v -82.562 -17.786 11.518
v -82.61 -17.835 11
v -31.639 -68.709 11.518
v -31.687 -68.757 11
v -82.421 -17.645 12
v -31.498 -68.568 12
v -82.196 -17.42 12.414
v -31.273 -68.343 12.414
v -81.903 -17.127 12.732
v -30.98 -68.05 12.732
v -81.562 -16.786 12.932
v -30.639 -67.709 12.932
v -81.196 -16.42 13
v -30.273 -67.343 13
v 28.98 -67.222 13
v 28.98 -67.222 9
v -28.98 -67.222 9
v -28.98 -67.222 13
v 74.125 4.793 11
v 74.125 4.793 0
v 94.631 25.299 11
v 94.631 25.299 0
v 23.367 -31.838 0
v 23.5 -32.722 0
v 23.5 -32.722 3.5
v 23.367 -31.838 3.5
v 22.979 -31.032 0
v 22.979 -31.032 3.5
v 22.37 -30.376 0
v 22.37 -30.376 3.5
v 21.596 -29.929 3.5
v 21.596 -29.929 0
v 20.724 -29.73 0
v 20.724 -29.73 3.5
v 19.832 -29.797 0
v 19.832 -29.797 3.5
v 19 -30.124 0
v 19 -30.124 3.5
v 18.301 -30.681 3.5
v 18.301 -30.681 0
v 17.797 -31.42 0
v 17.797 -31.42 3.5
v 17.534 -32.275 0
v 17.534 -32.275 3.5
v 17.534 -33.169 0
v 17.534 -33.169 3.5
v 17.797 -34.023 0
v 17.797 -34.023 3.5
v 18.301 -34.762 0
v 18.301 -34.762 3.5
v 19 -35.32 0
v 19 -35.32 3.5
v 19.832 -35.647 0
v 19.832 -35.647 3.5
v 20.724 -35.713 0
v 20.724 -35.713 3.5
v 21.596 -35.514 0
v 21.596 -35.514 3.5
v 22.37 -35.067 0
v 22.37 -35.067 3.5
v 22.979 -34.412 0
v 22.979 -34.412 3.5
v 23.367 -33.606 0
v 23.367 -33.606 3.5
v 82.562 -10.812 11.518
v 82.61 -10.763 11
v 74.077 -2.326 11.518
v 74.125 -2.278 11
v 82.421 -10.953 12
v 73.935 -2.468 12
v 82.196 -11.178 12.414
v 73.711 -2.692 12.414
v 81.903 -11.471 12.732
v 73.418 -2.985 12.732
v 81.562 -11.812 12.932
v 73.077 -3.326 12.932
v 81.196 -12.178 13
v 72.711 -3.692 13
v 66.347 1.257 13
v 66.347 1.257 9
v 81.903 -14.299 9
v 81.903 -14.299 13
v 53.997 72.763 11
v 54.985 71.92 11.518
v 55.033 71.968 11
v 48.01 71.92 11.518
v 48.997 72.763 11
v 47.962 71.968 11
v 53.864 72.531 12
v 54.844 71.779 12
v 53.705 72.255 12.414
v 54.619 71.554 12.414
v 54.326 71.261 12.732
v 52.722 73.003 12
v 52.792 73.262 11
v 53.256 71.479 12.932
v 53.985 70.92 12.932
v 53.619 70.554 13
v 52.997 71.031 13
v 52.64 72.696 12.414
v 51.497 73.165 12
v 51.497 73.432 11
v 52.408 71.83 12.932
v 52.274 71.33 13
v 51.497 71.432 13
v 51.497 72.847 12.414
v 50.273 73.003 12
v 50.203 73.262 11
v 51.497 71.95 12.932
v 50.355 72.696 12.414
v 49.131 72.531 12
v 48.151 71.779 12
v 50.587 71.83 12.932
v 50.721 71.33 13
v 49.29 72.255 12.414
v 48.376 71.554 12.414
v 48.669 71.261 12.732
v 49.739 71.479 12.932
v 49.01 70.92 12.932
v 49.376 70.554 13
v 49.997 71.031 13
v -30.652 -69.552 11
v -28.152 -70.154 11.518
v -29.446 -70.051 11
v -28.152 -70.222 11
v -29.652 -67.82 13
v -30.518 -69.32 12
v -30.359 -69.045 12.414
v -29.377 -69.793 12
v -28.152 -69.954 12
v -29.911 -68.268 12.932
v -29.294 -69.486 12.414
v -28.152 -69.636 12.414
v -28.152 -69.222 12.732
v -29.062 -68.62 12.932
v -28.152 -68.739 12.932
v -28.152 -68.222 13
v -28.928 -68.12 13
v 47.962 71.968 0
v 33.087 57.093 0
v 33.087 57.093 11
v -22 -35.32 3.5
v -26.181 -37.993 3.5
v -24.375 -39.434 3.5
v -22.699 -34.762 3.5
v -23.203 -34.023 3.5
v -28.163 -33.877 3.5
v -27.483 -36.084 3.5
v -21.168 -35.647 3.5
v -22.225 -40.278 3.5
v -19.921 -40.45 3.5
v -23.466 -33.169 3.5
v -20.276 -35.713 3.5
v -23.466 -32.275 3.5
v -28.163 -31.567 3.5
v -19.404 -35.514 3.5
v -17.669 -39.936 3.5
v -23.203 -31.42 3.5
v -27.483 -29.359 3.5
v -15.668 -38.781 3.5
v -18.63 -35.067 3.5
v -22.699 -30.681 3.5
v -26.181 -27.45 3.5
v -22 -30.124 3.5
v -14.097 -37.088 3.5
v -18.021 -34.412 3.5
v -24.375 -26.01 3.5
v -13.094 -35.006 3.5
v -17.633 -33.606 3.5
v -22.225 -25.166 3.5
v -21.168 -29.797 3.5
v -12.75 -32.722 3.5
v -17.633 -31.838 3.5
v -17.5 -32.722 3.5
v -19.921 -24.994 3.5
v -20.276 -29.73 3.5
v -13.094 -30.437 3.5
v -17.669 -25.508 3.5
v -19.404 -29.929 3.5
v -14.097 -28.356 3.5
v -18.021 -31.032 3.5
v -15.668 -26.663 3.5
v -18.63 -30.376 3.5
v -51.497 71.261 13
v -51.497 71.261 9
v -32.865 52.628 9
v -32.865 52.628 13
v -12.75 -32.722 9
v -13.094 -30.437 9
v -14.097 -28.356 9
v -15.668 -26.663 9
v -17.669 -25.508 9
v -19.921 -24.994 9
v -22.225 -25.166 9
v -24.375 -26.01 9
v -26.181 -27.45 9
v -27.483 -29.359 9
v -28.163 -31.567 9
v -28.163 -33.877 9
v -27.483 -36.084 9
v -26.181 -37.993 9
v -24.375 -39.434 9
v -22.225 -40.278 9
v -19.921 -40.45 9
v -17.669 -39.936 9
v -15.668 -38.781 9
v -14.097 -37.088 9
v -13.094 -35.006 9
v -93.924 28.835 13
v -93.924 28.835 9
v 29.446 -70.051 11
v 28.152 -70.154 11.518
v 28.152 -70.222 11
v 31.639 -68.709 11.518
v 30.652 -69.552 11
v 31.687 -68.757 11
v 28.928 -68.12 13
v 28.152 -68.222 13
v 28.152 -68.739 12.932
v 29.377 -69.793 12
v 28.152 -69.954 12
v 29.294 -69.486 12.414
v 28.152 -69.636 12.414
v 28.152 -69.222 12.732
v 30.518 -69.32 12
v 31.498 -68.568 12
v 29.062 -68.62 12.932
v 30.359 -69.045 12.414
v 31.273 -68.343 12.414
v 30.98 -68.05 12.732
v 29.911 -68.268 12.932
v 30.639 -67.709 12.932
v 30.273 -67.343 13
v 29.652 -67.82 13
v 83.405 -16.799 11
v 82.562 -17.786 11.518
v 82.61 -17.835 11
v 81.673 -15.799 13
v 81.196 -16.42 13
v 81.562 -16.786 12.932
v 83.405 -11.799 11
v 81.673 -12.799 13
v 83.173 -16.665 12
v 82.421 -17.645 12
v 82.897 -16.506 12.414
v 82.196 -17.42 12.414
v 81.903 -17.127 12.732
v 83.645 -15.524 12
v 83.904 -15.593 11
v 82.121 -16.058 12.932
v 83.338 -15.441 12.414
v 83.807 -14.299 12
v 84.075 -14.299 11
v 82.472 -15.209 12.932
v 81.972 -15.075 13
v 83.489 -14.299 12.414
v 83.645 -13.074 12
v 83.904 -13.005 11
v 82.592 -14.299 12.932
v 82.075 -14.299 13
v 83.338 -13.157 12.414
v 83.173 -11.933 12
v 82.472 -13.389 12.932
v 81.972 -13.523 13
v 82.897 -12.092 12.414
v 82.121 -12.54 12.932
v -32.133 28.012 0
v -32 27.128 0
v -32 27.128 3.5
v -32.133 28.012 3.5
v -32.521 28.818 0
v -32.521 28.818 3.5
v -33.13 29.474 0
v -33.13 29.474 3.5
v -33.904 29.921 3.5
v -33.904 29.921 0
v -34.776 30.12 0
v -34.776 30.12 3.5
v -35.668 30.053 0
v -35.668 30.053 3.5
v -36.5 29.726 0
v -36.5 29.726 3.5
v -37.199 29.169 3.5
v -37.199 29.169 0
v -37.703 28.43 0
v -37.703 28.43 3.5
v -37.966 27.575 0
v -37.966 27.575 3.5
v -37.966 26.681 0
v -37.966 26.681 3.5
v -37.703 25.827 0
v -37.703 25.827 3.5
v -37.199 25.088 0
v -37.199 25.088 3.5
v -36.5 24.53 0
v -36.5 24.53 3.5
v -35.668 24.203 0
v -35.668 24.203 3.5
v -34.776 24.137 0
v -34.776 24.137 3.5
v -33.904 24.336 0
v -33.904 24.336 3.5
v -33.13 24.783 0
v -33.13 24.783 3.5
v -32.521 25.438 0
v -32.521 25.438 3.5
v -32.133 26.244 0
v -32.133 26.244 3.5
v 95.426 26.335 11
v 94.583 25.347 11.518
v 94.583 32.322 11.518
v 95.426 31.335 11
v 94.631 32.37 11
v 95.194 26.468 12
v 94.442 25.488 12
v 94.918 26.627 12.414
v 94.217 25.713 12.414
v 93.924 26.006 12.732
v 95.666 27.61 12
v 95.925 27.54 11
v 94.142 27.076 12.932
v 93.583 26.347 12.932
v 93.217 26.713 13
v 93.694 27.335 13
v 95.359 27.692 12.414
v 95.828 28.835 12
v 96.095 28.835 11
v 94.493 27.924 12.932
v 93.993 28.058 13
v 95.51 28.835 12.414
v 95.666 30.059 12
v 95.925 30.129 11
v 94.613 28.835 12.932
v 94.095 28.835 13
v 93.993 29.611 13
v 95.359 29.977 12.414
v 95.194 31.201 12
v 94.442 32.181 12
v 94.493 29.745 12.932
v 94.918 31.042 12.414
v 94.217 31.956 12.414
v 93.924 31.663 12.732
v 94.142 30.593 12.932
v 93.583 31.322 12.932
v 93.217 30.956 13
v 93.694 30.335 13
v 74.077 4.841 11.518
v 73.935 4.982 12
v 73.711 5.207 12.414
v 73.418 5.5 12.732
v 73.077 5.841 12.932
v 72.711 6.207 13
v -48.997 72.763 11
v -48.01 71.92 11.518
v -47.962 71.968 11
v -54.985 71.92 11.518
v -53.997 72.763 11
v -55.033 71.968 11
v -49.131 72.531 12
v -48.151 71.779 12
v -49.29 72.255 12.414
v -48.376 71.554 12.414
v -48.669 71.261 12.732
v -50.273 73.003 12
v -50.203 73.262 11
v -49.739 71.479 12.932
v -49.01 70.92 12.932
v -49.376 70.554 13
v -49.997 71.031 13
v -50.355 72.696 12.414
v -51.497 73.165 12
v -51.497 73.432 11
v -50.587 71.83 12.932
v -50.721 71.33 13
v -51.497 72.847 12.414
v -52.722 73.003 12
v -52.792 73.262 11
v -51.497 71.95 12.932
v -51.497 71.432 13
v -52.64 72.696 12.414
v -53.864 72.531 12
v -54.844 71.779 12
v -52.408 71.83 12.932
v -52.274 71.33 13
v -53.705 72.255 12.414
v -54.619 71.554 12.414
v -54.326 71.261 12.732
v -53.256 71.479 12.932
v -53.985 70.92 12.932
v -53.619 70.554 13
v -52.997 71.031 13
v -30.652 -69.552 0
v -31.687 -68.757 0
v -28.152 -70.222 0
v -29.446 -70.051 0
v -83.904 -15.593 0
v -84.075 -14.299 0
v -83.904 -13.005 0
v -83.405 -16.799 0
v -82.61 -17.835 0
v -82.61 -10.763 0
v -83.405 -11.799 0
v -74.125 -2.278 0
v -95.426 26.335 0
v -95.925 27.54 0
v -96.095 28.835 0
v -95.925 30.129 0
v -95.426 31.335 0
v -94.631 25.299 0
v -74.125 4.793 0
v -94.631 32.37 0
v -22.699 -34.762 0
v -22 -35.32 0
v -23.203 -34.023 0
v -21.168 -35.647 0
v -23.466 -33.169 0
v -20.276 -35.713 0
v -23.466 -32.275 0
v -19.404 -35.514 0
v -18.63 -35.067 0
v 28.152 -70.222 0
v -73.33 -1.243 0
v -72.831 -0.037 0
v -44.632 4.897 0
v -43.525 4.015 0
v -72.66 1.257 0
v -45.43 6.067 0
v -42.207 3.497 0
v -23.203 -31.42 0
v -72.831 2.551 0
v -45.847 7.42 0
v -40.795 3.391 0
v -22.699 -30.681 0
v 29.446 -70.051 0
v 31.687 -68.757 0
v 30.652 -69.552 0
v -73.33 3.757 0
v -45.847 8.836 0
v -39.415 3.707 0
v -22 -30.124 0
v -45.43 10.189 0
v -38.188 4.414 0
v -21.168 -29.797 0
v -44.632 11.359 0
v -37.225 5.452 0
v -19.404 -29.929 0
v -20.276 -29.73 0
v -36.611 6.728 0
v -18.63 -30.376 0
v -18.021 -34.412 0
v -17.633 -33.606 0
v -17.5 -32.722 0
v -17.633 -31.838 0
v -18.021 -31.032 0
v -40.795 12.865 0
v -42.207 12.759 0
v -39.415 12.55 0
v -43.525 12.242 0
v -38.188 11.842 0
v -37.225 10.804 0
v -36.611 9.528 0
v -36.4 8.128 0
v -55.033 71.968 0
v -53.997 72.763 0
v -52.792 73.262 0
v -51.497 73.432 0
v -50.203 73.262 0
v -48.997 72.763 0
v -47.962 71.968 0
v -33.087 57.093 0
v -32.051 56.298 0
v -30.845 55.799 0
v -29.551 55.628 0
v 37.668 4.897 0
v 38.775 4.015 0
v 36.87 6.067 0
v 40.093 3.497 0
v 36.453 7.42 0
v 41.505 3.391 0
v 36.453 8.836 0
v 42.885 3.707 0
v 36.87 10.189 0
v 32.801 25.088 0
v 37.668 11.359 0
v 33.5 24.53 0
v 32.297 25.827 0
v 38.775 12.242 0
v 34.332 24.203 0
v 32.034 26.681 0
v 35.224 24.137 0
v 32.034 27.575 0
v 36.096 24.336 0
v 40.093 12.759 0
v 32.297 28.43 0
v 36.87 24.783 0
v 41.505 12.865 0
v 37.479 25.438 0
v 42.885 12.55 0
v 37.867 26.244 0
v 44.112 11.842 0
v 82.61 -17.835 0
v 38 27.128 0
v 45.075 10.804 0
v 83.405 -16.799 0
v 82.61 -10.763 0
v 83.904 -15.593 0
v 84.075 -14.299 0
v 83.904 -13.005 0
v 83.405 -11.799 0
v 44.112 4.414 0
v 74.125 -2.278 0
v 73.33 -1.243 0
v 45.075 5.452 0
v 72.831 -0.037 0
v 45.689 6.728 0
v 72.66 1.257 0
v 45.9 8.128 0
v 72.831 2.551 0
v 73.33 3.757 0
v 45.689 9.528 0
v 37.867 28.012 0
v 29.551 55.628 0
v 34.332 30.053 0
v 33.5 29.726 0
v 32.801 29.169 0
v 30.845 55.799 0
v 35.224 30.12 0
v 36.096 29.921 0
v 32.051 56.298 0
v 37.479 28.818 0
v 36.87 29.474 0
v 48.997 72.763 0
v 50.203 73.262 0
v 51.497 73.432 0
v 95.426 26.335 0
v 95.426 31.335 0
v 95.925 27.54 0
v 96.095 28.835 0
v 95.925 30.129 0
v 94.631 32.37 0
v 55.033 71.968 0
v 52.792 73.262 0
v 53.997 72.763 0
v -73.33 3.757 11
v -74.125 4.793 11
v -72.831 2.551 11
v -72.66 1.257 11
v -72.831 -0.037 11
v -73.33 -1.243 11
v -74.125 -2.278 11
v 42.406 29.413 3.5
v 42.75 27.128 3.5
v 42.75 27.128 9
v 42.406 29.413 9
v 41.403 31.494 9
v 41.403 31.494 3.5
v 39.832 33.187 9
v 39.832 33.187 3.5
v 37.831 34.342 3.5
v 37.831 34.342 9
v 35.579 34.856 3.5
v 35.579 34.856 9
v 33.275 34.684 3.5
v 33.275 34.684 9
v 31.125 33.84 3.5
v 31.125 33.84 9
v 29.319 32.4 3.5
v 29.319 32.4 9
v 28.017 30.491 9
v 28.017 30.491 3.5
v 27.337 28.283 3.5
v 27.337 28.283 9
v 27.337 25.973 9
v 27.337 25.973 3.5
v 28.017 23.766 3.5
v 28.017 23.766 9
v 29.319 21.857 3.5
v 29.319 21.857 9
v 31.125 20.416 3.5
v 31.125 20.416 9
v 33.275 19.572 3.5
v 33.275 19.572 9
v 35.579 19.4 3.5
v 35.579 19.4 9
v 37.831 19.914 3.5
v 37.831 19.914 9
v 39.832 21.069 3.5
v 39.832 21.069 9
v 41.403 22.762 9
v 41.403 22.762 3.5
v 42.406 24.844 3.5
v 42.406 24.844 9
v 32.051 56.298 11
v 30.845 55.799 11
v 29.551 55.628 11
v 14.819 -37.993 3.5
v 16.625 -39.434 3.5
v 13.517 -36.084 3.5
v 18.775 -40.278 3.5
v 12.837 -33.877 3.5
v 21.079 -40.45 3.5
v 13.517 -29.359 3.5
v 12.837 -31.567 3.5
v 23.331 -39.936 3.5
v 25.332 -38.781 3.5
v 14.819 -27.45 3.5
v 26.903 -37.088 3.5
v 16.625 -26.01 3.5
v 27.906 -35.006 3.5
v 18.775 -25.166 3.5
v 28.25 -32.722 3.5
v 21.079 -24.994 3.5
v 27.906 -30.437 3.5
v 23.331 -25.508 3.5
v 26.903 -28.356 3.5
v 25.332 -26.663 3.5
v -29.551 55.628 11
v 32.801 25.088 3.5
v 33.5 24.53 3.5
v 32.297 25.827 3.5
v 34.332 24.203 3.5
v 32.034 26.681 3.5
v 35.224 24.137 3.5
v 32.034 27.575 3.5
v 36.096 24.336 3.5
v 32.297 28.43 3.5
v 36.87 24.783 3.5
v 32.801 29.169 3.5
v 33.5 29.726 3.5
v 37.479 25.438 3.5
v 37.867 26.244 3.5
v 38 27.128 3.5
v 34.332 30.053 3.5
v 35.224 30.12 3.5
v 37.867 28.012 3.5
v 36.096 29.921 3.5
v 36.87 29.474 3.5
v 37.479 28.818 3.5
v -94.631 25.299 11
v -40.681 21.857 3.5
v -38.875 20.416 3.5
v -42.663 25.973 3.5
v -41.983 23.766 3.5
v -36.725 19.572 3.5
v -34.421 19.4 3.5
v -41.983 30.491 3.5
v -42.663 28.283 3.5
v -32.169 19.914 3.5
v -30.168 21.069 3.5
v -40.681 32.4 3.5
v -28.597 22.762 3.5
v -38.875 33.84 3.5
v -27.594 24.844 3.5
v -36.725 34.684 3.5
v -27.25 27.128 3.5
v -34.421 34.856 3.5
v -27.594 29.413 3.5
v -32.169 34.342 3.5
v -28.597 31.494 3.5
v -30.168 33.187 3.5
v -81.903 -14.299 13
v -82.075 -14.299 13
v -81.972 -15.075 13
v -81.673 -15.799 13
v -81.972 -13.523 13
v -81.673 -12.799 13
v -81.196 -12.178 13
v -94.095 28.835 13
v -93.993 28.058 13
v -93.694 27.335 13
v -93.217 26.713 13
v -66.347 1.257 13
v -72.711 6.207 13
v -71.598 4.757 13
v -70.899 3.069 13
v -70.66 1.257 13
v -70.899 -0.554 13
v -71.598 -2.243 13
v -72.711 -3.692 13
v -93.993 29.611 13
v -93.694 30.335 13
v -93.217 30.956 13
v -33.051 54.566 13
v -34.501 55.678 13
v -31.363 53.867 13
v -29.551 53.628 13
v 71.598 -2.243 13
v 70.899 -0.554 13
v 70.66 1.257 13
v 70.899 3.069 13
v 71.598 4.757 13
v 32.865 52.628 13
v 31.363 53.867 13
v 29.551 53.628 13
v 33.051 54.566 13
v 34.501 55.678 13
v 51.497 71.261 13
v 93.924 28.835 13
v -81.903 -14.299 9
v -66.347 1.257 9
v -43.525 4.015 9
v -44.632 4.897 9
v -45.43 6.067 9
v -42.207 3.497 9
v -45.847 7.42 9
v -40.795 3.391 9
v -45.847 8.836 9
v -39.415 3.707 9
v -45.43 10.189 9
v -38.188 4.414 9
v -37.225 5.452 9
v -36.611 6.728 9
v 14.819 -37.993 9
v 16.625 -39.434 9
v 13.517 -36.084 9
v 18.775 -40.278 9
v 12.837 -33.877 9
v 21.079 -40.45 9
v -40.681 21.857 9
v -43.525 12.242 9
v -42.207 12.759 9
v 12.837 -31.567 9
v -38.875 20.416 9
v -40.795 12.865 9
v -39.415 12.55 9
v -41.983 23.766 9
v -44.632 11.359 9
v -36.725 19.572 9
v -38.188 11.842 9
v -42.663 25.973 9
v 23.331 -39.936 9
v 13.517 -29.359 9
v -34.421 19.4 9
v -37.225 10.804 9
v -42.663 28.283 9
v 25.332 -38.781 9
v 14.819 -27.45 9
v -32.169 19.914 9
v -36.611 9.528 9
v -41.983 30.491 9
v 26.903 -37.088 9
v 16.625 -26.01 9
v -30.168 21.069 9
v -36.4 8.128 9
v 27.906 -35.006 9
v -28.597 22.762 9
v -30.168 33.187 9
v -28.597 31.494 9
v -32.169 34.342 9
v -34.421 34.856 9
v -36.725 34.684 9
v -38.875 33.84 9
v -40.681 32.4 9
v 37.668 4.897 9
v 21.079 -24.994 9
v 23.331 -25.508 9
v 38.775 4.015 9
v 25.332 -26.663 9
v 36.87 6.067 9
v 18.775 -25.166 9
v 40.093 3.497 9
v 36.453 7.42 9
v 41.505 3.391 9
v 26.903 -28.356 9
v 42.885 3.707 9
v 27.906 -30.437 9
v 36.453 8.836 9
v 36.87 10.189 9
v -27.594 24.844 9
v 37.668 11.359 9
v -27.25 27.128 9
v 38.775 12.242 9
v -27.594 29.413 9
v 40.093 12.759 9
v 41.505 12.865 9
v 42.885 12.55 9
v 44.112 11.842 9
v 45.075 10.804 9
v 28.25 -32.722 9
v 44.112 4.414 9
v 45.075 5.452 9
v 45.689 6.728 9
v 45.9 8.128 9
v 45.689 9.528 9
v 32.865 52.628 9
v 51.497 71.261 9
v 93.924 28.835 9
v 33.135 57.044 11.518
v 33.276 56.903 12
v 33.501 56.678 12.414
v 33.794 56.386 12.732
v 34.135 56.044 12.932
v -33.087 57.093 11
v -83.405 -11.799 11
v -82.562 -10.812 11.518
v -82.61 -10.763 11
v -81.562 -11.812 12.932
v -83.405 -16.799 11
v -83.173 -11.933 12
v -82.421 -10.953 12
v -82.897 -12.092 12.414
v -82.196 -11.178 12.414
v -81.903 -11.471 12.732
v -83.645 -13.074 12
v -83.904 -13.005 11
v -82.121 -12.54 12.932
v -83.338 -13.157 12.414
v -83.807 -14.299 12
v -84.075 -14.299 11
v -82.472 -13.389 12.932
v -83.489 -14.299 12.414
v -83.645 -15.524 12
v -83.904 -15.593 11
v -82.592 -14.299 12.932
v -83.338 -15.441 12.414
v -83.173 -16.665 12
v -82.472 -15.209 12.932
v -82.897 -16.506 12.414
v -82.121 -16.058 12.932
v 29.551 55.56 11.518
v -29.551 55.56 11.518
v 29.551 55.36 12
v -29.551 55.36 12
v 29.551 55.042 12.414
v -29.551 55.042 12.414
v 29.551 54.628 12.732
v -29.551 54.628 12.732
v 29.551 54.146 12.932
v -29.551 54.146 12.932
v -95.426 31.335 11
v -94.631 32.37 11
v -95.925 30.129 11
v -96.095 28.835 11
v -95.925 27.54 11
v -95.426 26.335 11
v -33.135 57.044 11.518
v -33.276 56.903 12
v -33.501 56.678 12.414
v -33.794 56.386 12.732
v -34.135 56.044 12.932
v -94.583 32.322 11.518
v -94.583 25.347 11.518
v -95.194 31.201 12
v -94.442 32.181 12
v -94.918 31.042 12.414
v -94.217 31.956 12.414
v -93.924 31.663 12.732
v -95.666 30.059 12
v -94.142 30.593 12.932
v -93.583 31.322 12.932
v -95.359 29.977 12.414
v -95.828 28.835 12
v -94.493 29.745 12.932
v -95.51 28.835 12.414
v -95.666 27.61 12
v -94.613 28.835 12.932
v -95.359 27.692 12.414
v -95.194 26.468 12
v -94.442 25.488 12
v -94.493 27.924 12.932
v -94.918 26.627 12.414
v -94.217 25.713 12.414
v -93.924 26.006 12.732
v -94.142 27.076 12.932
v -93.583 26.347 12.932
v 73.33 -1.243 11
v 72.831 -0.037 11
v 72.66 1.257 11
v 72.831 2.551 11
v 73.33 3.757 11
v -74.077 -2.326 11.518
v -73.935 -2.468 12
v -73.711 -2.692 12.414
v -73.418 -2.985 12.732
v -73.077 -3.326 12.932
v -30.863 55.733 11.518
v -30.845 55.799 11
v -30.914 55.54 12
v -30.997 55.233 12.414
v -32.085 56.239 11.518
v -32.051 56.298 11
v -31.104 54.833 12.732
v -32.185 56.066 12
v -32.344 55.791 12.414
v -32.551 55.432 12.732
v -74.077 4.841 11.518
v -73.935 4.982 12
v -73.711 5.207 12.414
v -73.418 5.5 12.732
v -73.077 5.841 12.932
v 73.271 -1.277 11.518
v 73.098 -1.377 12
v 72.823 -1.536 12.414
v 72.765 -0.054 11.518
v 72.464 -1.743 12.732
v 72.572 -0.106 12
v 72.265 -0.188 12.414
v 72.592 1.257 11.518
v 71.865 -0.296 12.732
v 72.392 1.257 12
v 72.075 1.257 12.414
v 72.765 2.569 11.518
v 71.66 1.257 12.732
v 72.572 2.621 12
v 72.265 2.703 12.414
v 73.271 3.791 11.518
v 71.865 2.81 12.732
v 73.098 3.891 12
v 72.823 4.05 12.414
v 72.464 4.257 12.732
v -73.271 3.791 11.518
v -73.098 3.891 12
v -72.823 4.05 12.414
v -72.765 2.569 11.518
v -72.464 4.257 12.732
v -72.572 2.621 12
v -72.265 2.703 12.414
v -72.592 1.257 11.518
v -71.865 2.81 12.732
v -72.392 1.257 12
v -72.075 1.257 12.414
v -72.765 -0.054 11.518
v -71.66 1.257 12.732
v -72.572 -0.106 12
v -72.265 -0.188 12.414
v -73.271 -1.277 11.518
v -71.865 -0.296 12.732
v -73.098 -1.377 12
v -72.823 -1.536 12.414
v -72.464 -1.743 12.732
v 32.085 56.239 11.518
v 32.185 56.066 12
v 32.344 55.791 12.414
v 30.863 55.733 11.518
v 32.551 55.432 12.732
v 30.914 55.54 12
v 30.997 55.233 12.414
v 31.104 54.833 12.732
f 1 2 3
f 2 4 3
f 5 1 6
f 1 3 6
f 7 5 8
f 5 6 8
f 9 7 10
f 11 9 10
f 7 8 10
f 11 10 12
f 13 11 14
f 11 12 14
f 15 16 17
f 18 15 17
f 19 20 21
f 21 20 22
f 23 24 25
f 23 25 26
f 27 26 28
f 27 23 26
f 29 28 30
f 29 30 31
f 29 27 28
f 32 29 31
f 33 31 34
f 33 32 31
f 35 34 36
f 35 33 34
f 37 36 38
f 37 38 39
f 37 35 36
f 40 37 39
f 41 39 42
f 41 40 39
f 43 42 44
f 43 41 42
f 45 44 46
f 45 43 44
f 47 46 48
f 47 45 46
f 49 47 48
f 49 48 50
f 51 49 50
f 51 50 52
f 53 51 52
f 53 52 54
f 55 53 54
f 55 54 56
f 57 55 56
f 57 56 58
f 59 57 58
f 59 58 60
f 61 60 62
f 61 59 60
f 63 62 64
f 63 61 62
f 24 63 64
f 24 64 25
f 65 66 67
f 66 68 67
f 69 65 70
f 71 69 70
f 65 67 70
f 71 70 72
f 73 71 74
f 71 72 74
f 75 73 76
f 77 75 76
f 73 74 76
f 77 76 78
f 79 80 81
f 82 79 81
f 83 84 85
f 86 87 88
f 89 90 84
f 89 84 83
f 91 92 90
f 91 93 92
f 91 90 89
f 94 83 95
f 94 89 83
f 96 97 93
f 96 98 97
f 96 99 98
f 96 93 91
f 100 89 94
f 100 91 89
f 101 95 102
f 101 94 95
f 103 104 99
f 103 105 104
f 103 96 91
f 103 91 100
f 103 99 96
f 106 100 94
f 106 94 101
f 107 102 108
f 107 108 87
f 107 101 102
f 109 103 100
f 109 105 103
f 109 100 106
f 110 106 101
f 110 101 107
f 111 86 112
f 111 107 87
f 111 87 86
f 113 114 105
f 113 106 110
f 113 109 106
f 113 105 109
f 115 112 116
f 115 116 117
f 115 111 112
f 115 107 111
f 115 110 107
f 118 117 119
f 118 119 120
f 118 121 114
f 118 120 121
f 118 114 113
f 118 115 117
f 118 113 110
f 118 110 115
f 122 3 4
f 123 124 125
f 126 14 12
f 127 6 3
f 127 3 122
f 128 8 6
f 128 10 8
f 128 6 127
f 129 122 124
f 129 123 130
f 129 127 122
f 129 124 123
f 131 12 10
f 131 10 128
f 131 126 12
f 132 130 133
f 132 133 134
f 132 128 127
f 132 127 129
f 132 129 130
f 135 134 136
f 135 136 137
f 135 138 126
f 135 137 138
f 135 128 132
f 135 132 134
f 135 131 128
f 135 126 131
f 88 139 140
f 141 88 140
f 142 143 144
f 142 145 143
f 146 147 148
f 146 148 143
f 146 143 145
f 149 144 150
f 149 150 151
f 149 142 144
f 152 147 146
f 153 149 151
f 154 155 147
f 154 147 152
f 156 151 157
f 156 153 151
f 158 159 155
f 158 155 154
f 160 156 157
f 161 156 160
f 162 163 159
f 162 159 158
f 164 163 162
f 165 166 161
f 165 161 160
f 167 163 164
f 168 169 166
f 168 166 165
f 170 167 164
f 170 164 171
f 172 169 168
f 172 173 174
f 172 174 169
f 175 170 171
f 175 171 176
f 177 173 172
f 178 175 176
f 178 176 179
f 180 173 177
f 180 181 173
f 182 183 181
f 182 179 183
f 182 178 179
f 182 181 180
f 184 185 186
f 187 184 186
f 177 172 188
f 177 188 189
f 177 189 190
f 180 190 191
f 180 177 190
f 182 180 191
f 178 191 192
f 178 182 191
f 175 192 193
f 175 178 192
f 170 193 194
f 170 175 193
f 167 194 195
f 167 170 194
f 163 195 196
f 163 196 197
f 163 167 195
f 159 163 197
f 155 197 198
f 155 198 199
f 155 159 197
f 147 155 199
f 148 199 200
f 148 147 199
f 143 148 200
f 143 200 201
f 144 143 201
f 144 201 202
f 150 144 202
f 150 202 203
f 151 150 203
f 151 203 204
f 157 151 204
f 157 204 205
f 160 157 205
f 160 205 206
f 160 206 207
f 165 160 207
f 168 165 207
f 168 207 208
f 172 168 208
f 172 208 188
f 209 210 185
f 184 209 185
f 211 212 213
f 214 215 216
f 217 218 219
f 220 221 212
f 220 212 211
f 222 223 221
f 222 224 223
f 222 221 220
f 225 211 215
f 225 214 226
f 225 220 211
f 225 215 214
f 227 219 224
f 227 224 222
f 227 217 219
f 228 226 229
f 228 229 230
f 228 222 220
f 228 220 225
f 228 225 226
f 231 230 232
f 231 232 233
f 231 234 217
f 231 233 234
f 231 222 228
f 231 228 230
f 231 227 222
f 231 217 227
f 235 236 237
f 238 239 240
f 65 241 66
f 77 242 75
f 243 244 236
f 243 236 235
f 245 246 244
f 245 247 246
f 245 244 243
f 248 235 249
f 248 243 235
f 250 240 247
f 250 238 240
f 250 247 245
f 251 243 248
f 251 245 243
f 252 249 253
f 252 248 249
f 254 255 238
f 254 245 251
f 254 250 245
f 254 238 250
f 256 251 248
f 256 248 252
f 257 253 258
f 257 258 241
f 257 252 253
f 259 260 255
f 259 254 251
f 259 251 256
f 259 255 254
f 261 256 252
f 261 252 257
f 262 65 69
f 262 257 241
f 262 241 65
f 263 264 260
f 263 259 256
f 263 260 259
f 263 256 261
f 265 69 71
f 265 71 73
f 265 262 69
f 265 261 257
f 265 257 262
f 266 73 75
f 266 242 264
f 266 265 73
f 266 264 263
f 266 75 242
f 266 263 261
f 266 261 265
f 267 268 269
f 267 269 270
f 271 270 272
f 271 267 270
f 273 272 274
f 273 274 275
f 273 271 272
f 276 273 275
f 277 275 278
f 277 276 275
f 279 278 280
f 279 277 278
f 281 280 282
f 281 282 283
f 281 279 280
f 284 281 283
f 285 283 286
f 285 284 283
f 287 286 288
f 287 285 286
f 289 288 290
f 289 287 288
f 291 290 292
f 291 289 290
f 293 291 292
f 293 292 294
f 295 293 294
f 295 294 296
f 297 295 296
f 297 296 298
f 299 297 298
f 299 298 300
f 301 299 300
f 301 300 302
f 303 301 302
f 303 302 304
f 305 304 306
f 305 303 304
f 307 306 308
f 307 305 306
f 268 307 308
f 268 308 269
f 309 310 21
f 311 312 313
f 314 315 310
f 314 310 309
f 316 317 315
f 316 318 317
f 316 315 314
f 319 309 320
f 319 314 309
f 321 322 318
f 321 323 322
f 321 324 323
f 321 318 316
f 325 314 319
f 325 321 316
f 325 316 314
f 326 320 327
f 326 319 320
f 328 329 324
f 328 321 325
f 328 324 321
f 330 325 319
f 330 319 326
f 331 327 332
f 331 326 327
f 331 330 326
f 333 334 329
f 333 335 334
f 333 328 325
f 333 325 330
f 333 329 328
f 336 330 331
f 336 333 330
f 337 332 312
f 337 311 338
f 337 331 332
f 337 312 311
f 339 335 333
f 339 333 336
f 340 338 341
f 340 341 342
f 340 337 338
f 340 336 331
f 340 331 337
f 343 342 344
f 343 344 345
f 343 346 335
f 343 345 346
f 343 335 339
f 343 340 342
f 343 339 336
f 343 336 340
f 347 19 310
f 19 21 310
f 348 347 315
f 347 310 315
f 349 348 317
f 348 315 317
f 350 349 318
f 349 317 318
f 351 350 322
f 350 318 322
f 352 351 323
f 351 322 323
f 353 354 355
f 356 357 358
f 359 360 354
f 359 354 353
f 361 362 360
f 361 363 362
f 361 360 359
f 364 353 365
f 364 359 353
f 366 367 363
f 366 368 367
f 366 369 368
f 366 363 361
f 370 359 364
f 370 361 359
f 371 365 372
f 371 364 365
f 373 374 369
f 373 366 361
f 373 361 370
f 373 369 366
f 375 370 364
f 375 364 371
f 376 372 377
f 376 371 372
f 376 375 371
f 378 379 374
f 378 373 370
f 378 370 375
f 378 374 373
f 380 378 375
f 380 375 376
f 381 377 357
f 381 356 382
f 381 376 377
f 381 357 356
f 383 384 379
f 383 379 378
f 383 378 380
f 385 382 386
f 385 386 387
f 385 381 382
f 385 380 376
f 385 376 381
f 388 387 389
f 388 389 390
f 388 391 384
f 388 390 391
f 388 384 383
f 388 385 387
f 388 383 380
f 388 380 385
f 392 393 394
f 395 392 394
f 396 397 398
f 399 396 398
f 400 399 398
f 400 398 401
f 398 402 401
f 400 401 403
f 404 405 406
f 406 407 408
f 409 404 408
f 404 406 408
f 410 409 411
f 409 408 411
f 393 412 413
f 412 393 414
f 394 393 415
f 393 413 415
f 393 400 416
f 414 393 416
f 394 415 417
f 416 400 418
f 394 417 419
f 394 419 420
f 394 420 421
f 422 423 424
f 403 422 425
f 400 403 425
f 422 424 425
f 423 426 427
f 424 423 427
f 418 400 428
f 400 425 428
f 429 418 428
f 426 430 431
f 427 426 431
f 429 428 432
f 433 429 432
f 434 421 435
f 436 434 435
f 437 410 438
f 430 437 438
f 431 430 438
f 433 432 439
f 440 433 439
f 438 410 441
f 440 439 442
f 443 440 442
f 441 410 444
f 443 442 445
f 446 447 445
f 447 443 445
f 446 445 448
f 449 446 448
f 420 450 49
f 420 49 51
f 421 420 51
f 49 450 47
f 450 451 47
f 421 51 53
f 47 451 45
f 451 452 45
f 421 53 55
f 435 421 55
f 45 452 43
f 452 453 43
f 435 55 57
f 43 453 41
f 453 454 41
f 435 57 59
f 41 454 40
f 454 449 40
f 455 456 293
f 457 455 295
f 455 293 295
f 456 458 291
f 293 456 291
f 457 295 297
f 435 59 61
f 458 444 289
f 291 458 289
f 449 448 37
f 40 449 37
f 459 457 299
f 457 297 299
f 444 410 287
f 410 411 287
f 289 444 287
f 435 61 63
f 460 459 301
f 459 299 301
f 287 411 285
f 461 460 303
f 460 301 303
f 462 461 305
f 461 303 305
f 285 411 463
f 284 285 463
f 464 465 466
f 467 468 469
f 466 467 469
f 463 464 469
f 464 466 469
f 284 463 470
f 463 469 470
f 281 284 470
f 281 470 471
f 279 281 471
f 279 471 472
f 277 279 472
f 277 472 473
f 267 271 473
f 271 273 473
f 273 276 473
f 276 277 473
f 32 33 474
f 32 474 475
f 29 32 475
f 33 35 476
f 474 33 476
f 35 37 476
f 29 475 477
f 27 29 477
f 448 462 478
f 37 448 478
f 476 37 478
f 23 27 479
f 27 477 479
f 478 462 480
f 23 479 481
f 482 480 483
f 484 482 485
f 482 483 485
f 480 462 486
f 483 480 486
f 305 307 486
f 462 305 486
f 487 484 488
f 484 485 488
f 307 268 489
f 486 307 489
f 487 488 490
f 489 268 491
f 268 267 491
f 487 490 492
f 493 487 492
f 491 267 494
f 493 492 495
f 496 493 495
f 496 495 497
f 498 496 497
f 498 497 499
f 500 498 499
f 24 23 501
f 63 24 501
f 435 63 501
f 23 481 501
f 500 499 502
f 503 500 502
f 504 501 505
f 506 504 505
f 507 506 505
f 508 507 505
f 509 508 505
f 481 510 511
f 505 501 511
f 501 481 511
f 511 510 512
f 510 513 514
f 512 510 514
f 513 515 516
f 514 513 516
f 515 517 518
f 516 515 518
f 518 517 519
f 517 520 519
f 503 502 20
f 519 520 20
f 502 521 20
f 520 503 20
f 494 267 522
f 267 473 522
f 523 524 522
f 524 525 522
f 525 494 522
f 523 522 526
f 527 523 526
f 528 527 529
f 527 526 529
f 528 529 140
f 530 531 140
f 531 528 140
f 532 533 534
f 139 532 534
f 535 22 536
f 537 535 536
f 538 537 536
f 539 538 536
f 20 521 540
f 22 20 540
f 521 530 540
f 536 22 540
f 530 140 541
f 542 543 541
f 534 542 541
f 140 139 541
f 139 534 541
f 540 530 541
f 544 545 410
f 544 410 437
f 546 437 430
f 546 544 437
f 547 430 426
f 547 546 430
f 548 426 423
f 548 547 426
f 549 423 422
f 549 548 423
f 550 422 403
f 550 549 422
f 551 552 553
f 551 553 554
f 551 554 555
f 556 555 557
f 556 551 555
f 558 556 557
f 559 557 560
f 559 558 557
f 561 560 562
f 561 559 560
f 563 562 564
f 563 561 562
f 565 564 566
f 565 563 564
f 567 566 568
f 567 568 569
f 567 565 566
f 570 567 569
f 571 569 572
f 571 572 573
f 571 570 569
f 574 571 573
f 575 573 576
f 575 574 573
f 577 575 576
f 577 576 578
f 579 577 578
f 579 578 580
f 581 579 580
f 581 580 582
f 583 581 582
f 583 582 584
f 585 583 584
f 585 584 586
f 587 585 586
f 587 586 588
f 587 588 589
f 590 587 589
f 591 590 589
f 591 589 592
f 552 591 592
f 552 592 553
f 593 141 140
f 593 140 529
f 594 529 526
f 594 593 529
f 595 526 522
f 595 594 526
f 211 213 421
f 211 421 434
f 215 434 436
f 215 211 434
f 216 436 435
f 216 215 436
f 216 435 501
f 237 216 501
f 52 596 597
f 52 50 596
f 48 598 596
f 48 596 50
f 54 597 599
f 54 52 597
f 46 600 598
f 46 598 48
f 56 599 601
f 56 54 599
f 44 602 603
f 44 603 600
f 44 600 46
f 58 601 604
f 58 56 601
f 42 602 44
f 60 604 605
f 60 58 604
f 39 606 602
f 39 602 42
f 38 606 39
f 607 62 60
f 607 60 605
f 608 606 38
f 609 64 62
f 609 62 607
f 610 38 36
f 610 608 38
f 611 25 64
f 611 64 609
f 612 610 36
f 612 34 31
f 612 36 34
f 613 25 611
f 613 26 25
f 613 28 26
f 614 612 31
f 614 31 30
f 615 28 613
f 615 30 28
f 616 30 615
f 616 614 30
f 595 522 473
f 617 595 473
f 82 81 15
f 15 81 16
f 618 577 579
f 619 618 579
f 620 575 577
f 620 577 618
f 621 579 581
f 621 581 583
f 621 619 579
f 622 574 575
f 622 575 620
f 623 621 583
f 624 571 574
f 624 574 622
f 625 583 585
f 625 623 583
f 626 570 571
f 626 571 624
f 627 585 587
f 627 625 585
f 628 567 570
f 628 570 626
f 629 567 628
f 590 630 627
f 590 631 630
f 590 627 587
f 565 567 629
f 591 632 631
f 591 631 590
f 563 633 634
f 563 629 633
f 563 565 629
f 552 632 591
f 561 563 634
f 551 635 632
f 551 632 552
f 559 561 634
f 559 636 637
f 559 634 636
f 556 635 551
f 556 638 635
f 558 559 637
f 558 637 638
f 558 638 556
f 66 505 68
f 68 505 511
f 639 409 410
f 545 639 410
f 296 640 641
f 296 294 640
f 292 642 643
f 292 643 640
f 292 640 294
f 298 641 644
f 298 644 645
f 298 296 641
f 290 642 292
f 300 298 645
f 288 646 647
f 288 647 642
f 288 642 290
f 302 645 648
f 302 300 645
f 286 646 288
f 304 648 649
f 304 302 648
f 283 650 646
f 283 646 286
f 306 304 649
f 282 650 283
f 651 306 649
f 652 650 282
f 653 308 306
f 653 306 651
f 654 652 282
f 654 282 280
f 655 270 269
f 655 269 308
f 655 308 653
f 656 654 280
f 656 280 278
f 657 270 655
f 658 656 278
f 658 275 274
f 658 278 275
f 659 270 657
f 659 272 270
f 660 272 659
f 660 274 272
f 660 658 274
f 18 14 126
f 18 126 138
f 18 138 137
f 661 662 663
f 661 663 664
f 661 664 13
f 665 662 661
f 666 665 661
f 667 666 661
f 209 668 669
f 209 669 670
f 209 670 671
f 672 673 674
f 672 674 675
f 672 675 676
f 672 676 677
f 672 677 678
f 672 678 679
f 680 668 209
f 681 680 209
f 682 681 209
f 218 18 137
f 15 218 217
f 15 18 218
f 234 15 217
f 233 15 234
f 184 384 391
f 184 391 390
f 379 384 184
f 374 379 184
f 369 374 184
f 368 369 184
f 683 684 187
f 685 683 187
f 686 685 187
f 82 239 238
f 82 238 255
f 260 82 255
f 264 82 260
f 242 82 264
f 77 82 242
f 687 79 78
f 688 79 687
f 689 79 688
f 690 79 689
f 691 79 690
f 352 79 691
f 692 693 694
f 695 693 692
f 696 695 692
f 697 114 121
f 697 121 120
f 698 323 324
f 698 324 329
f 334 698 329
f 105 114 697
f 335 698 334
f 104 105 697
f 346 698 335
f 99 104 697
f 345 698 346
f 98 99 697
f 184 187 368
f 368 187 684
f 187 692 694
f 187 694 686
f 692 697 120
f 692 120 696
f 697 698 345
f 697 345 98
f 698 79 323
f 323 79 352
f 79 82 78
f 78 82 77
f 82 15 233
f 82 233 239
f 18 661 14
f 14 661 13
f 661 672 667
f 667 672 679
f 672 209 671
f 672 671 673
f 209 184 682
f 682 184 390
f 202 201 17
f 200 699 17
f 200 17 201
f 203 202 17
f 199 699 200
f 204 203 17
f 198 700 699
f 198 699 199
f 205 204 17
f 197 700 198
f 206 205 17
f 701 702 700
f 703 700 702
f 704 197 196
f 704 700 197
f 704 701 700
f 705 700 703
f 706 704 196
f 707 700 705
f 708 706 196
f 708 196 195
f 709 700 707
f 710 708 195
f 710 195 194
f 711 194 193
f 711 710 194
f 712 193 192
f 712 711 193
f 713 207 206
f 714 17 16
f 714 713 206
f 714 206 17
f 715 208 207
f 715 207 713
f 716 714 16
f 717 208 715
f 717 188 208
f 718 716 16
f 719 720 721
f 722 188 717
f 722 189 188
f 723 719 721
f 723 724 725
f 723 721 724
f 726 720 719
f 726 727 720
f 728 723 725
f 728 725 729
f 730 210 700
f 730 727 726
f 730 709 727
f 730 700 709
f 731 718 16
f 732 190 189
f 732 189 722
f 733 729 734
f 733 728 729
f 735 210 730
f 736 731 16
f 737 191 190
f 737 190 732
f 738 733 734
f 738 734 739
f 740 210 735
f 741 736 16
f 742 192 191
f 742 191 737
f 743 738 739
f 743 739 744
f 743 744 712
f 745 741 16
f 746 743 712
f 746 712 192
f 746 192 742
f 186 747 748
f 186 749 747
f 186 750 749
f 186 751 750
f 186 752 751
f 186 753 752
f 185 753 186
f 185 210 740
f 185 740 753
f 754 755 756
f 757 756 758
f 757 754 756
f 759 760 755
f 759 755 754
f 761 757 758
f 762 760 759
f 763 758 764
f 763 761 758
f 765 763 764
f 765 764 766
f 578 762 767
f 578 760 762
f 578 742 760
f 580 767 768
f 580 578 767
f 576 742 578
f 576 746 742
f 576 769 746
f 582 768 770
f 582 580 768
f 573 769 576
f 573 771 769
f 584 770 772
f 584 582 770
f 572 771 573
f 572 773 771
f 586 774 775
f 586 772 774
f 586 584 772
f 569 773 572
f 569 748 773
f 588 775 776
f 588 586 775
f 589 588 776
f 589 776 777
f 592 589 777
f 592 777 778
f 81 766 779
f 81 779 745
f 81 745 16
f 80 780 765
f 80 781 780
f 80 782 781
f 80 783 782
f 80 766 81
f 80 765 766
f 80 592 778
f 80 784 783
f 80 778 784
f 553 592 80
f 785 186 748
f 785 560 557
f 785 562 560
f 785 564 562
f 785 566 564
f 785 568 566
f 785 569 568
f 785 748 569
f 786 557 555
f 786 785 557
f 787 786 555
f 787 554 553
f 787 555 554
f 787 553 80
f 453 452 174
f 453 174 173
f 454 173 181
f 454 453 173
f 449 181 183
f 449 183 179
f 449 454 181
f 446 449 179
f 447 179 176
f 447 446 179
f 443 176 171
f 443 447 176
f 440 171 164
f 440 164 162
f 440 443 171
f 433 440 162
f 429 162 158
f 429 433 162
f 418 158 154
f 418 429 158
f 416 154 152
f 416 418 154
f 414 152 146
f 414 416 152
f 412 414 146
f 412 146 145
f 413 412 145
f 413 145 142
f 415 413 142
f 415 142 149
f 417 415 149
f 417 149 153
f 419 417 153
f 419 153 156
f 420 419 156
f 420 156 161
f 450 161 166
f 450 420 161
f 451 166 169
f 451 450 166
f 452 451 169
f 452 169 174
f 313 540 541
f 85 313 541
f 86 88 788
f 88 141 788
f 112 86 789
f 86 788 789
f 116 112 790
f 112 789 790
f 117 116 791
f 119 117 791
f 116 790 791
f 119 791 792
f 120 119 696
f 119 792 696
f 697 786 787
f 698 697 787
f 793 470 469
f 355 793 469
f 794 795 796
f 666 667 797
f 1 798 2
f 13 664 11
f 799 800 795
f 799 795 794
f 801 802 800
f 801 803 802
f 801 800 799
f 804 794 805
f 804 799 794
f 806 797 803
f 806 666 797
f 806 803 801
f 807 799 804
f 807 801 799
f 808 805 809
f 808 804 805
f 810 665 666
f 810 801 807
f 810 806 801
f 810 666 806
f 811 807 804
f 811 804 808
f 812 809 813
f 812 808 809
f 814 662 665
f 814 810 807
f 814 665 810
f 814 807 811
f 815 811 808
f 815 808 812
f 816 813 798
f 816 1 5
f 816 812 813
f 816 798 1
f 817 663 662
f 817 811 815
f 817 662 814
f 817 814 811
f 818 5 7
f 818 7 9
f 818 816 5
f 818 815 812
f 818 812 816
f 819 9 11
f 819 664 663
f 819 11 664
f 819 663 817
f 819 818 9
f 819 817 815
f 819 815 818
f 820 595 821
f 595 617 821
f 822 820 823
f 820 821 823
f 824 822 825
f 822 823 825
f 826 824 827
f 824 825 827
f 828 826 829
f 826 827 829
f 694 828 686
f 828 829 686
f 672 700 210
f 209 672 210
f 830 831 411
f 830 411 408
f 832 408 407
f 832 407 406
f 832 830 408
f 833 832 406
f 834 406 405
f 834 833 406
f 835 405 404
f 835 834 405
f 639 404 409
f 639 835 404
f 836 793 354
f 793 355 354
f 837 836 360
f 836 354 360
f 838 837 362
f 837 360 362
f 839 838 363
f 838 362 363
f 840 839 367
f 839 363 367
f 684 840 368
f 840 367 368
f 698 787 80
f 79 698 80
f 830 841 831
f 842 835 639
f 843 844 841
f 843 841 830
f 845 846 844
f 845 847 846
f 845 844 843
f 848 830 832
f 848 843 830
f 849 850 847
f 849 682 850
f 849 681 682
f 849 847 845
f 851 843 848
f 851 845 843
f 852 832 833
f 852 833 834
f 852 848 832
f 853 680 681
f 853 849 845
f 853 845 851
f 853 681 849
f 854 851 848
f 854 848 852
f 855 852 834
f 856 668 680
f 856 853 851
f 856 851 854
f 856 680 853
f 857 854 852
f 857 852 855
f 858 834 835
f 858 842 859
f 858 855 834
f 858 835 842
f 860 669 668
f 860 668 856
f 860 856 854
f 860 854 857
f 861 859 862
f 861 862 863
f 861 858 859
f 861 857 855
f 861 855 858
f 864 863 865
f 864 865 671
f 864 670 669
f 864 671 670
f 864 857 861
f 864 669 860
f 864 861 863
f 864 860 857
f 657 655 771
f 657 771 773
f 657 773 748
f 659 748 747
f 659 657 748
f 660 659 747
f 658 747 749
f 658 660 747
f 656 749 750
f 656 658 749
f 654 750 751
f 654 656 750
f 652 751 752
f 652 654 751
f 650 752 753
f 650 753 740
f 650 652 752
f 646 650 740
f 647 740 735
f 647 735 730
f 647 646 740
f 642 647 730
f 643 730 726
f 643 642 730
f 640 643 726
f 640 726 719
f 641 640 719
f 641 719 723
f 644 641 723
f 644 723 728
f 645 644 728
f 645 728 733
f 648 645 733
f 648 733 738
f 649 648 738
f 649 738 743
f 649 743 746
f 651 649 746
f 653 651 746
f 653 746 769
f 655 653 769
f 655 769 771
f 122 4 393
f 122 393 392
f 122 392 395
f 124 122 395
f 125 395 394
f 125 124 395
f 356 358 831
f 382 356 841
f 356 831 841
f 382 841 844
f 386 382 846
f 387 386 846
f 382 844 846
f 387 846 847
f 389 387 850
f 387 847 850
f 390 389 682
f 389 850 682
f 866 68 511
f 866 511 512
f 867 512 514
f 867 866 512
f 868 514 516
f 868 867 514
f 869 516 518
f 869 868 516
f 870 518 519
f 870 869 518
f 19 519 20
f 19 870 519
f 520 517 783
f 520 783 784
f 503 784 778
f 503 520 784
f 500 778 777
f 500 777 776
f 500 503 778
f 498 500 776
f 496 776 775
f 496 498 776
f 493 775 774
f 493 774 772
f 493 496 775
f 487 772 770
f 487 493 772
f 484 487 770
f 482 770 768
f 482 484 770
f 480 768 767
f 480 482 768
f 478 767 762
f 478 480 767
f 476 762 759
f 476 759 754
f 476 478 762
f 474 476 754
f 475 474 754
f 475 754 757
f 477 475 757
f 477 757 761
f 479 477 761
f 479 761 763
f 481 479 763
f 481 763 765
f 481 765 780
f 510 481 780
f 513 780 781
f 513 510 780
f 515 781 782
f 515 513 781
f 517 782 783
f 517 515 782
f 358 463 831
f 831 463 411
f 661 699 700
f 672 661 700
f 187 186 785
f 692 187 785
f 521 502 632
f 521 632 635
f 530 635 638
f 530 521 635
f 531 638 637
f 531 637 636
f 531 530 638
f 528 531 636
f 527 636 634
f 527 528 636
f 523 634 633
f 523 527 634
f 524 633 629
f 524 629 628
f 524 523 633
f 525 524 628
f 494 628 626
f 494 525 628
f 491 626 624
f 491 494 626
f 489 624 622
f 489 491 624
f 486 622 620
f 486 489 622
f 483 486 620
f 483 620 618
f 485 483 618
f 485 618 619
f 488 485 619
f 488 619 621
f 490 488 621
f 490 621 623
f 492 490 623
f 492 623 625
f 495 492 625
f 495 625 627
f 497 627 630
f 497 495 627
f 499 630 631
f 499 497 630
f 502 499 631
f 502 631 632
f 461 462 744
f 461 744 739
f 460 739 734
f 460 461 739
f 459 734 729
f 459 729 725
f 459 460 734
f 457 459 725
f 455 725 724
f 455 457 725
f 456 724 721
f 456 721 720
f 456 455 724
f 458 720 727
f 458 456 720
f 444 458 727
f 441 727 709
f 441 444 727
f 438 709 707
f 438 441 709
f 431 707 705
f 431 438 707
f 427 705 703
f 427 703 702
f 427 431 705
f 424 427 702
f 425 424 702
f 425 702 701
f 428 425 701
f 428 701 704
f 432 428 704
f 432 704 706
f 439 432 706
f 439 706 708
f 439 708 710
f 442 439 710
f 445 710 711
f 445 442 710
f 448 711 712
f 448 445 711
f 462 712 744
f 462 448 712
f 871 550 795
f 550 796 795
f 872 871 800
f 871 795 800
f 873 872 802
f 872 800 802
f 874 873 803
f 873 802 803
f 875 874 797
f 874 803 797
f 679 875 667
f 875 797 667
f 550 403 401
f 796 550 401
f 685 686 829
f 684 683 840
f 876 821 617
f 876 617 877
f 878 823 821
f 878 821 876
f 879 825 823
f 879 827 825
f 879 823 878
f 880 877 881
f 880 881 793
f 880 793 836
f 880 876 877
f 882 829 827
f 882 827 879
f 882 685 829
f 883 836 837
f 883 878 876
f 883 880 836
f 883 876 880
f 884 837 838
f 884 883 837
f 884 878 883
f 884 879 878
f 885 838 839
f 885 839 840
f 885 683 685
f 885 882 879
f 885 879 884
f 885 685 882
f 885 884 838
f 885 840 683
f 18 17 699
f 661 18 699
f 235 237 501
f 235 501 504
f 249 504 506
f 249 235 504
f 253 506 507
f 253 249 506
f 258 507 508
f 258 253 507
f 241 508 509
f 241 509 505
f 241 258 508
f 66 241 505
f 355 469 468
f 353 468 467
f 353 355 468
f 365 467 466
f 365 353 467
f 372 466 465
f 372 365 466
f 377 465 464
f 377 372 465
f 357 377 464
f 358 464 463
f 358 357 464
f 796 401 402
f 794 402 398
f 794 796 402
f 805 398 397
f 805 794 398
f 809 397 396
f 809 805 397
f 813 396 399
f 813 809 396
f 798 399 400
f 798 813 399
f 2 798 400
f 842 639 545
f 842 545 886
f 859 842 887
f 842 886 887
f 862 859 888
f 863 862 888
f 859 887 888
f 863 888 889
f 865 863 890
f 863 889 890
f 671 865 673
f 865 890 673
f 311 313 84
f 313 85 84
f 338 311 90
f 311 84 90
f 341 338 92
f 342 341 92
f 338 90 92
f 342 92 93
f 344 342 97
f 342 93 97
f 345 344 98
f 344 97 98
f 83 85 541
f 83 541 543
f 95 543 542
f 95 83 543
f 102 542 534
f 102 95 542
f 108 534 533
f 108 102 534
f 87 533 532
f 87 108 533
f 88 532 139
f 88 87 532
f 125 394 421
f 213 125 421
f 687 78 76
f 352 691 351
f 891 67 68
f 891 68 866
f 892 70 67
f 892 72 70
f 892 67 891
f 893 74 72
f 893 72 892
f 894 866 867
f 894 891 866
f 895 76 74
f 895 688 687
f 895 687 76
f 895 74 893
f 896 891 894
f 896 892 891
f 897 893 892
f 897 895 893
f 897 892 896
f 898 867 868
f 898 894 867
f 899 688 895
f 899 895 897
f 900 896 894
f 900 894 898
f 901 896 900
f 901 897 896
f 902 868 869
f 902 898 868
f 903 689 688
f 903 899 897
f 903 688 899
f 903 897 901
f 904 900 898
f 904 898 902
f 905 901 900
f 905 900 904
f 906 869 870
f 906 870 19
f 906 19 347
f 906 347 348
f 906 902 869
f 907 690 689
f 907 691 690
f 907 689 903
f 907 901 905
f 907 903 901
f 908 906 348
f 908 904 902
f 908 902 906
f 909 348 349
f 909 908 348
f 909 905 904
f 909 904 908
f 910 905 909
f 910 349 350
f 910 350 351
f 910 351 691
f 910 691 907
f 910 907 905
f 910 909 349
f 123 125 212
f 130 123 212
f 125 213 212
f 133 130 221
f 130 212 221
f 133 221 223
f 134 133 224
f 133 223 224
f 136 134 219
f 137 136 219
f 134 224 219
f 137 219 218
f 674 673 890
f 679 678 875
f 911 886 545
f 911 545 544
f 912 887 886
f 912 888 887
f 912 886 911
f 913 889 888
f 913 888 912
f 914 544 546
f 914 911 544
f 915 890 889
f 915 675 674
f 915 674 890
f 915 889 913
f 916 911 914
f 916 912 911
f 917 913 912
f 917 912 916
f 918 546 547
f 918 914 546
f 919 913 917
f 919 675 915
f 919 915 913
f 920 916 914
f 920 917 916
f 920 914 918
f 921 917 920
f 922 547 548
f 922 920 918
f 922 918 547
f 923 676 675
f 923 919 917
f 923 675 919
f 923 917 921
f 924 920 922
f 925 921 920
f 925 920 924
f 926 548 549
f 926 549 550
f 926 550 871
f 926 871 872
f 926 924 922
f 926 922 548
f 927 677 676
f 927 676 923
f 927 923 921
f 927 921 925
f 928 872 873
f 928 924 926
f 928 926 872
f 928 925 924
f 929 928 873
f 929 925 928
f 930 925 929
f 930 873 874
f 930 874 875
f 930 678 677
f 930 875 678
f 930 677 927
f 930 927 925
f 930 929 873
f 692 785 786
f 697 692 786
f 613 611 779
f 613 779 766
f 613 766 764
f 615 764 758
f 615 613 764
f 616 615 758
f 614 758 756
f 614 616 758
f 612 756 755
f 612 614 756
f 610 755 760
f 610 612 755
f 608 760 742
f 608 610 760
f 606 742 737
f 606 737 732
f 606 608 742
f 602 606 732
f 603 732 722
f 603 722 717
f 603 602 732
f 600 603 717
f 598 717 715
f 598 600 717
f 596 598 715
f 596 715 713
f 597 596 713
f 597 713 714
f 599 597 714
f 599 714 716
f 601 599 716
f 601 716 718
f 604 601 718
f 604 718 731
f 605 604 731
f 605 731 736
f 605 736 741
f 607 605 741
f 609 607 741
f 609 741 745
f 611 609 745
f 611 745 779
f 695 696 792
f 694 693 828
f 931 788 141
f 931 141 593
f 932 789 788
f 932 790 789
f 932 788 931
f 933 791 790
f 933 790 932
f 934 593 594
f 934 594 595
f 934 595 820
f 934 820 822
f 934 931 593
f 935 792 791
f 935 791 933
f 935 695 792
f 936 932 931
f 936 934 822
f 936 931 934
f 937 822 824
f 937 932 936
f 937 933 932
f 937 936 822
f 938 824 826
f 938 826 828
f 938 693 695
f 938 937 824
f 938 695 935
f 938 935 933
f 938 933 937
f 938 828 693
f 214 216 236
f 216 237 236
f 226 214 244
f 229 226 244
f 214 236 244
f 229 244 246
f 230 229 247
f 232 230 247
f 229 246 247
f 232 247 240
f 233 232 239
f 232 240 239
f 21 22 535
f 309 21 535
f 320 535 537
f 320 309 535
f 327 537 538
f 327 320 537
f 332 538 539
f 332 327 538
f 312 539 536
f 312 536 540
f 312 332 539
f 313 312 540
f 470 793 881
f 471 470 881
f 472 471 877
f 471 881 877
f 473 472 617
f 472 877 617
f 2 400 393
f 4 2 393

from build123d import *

# Parameters (mm, degrees)
F2_R     = 7.75
F2_R_2   = 4.75
F3_DEPTH = 9
F4_DEPTH = 13
F0_R     = 7.75
F0_R_2   = 3
F5_DEPTH = 3.5
F6_R     = 5
F7_R     = 2


with BuildPart() as f3:
    # F2 (on Top) → F3 (new body)
    with BuildSketch(Plane.XY):
        Polygon((32.864719, 52.628166), (0, 52.628166), (-32.864719, 52.628166), (-51.497475, 71.260922), (-93.923882, 28.834515), (-66.346717, 1.25735), (-81.903066, -14.298999), (-28.980231, -67.221834), (0, -67.221834), (28.980231, -67.221834), (81.903066, -14.298999), (66.346717, 1.25735), (93.923882, 28.834515), (51.497475, 71.260922), align=None)
        with Locations((-20.5, -32.721834)):
            Circle(F2_R, mode=Mode.SUBTRACT)
        with Locations((20.5, -32.721834)):
            Circle(F2_R, mode=Mode.SUBTRACT)
        with Locations((-41.15, 8.128166)):
            Circle(F2_R_2, mode=Mode.SUBTRACT)
        with Locations((-35, 27.128166)):
            Circle(F2_R, mode=Mode.SUBTRACT)
        with Locations((41.15, 8.128166)):
            Circle(F2_R_2, mode=Mode.SUBTRACT)
        with Locations((35, 27.128166)):
            Circle(F2_R, mode=Mode.SUBTRACT)
    extrude(amount=F3_DEPTH)

    # F2 (on Top) → F4 (join)
    with BuildSketch(Plane.XY):
        Polygon((0, 55.628166), (-31.622078, 55.628166), (-51.497475, 75.503562), (-98.166522, 28.834515), (-70.589358, 1.25735), (-86.145707, -14.298999), (-30.222871, -70.221834), (0, -70.221834), (30.222871, -70.221834), (86.145707, -14.298999), (70.589358, 1.25735), (98.166522, 28.834515), (51.497475, 75.503562), (31.622078, 55.628166), align=None)
        Polygon((-32.864719, 52.628166), (0, 52.628166), (32.864719, 52.628166), (51.497475, 71.260922), (93.923882, 28.834515), (66.346717, 1.25735), (81.903066, -14.298999), (28.980231, -67.221834), (0, -67.221834), (-28.980231, -67.221834), (-81.903066, -14.298999), (-66.346717, 1.25735), (-93.923882, 28.834515), (-51.497475, 71.260922), align=None, mode=Mode.SUBTRACT)
    extrude(amount=F4_DEPTH)

    # F0 (on Top) → F5 (join)
    with BuildSketch(Plane.XY):
        with Locations((-35, 27.128166)):
            Circle(F0_R)
        with Locations((-35, 27.128166)):
            Circle(F0_R_2, mode=Mode.SUBTRACT)
        with Locations((35, 27.128166)):
            Circle(F0_R)
        with Locations((35, 27.128166)):
            Circle(F0_R_2, mode=Mode.SUBTRACT)
        with Locations((20.5, -32.721834)):
            Circle(F0_R)
        with Locations((20.5, -32.721834)):
            Circle(F0_R_2, mode=Mode.SUBTRACT)
        with Locations((-20.5, -32.721834)):
            Circle(F0_R)
        with Locations((-20.5, -32.721834)):
            Circle(F0_R_2, mode=Mode.SUBTRACT)
    extrude(amount=F5_DEPTH)

    # F6
    f6_edges = [f3.edges().sort_by_distance(p)[0] for p in [
        (-51.497475, 75.503562, 6.5),
        (-31.622078, 55.628166, 6.5),
        (51.497475, 75.503562, 6.5),
        (98.166522, 28.834515, 6.5),
        (70.589358, 1.25735, 6.5),
        (86.145707, -14.298999, 6.5),
        (30.222871, -70.221834, 6.5),
        (-30.222871, -70.221834, 6.5),
        (-86.145707, -14.298999, 6.5),
        (-70.589358, 1.25735, 6.5),
        (-98.166522, 28.834515, 6.5),
        (31.622078, 55.628166, 6.5),
    ]]
    fillet(f6_edges, radius=F6_R)

    # F7
    f7_edges = [f3.edges().sort_by_distance(p)[0] for p in [
        (-74.831998, 52.169039, 13),
        (-40.524242, 64.53033, 13),
        (0, 55.628166, 13),
        (40.524242, 64.53033, 13),
        (74.831998, 52.169039, 13),
        (84.37794, 15.045933, 13),
        (78.367532, -6.520824, 13),
        (57.148755, -43.295951, 13),
        (0, -70.221834, 13),
        (-57.148755, -43.295951, 13),
        (-78.367532, -6.520824, 13),
        (-84.37794, 15.045933, 13),
    ]]
    fillet(f7_edges, radius=F7_R)


solid = f3.part
